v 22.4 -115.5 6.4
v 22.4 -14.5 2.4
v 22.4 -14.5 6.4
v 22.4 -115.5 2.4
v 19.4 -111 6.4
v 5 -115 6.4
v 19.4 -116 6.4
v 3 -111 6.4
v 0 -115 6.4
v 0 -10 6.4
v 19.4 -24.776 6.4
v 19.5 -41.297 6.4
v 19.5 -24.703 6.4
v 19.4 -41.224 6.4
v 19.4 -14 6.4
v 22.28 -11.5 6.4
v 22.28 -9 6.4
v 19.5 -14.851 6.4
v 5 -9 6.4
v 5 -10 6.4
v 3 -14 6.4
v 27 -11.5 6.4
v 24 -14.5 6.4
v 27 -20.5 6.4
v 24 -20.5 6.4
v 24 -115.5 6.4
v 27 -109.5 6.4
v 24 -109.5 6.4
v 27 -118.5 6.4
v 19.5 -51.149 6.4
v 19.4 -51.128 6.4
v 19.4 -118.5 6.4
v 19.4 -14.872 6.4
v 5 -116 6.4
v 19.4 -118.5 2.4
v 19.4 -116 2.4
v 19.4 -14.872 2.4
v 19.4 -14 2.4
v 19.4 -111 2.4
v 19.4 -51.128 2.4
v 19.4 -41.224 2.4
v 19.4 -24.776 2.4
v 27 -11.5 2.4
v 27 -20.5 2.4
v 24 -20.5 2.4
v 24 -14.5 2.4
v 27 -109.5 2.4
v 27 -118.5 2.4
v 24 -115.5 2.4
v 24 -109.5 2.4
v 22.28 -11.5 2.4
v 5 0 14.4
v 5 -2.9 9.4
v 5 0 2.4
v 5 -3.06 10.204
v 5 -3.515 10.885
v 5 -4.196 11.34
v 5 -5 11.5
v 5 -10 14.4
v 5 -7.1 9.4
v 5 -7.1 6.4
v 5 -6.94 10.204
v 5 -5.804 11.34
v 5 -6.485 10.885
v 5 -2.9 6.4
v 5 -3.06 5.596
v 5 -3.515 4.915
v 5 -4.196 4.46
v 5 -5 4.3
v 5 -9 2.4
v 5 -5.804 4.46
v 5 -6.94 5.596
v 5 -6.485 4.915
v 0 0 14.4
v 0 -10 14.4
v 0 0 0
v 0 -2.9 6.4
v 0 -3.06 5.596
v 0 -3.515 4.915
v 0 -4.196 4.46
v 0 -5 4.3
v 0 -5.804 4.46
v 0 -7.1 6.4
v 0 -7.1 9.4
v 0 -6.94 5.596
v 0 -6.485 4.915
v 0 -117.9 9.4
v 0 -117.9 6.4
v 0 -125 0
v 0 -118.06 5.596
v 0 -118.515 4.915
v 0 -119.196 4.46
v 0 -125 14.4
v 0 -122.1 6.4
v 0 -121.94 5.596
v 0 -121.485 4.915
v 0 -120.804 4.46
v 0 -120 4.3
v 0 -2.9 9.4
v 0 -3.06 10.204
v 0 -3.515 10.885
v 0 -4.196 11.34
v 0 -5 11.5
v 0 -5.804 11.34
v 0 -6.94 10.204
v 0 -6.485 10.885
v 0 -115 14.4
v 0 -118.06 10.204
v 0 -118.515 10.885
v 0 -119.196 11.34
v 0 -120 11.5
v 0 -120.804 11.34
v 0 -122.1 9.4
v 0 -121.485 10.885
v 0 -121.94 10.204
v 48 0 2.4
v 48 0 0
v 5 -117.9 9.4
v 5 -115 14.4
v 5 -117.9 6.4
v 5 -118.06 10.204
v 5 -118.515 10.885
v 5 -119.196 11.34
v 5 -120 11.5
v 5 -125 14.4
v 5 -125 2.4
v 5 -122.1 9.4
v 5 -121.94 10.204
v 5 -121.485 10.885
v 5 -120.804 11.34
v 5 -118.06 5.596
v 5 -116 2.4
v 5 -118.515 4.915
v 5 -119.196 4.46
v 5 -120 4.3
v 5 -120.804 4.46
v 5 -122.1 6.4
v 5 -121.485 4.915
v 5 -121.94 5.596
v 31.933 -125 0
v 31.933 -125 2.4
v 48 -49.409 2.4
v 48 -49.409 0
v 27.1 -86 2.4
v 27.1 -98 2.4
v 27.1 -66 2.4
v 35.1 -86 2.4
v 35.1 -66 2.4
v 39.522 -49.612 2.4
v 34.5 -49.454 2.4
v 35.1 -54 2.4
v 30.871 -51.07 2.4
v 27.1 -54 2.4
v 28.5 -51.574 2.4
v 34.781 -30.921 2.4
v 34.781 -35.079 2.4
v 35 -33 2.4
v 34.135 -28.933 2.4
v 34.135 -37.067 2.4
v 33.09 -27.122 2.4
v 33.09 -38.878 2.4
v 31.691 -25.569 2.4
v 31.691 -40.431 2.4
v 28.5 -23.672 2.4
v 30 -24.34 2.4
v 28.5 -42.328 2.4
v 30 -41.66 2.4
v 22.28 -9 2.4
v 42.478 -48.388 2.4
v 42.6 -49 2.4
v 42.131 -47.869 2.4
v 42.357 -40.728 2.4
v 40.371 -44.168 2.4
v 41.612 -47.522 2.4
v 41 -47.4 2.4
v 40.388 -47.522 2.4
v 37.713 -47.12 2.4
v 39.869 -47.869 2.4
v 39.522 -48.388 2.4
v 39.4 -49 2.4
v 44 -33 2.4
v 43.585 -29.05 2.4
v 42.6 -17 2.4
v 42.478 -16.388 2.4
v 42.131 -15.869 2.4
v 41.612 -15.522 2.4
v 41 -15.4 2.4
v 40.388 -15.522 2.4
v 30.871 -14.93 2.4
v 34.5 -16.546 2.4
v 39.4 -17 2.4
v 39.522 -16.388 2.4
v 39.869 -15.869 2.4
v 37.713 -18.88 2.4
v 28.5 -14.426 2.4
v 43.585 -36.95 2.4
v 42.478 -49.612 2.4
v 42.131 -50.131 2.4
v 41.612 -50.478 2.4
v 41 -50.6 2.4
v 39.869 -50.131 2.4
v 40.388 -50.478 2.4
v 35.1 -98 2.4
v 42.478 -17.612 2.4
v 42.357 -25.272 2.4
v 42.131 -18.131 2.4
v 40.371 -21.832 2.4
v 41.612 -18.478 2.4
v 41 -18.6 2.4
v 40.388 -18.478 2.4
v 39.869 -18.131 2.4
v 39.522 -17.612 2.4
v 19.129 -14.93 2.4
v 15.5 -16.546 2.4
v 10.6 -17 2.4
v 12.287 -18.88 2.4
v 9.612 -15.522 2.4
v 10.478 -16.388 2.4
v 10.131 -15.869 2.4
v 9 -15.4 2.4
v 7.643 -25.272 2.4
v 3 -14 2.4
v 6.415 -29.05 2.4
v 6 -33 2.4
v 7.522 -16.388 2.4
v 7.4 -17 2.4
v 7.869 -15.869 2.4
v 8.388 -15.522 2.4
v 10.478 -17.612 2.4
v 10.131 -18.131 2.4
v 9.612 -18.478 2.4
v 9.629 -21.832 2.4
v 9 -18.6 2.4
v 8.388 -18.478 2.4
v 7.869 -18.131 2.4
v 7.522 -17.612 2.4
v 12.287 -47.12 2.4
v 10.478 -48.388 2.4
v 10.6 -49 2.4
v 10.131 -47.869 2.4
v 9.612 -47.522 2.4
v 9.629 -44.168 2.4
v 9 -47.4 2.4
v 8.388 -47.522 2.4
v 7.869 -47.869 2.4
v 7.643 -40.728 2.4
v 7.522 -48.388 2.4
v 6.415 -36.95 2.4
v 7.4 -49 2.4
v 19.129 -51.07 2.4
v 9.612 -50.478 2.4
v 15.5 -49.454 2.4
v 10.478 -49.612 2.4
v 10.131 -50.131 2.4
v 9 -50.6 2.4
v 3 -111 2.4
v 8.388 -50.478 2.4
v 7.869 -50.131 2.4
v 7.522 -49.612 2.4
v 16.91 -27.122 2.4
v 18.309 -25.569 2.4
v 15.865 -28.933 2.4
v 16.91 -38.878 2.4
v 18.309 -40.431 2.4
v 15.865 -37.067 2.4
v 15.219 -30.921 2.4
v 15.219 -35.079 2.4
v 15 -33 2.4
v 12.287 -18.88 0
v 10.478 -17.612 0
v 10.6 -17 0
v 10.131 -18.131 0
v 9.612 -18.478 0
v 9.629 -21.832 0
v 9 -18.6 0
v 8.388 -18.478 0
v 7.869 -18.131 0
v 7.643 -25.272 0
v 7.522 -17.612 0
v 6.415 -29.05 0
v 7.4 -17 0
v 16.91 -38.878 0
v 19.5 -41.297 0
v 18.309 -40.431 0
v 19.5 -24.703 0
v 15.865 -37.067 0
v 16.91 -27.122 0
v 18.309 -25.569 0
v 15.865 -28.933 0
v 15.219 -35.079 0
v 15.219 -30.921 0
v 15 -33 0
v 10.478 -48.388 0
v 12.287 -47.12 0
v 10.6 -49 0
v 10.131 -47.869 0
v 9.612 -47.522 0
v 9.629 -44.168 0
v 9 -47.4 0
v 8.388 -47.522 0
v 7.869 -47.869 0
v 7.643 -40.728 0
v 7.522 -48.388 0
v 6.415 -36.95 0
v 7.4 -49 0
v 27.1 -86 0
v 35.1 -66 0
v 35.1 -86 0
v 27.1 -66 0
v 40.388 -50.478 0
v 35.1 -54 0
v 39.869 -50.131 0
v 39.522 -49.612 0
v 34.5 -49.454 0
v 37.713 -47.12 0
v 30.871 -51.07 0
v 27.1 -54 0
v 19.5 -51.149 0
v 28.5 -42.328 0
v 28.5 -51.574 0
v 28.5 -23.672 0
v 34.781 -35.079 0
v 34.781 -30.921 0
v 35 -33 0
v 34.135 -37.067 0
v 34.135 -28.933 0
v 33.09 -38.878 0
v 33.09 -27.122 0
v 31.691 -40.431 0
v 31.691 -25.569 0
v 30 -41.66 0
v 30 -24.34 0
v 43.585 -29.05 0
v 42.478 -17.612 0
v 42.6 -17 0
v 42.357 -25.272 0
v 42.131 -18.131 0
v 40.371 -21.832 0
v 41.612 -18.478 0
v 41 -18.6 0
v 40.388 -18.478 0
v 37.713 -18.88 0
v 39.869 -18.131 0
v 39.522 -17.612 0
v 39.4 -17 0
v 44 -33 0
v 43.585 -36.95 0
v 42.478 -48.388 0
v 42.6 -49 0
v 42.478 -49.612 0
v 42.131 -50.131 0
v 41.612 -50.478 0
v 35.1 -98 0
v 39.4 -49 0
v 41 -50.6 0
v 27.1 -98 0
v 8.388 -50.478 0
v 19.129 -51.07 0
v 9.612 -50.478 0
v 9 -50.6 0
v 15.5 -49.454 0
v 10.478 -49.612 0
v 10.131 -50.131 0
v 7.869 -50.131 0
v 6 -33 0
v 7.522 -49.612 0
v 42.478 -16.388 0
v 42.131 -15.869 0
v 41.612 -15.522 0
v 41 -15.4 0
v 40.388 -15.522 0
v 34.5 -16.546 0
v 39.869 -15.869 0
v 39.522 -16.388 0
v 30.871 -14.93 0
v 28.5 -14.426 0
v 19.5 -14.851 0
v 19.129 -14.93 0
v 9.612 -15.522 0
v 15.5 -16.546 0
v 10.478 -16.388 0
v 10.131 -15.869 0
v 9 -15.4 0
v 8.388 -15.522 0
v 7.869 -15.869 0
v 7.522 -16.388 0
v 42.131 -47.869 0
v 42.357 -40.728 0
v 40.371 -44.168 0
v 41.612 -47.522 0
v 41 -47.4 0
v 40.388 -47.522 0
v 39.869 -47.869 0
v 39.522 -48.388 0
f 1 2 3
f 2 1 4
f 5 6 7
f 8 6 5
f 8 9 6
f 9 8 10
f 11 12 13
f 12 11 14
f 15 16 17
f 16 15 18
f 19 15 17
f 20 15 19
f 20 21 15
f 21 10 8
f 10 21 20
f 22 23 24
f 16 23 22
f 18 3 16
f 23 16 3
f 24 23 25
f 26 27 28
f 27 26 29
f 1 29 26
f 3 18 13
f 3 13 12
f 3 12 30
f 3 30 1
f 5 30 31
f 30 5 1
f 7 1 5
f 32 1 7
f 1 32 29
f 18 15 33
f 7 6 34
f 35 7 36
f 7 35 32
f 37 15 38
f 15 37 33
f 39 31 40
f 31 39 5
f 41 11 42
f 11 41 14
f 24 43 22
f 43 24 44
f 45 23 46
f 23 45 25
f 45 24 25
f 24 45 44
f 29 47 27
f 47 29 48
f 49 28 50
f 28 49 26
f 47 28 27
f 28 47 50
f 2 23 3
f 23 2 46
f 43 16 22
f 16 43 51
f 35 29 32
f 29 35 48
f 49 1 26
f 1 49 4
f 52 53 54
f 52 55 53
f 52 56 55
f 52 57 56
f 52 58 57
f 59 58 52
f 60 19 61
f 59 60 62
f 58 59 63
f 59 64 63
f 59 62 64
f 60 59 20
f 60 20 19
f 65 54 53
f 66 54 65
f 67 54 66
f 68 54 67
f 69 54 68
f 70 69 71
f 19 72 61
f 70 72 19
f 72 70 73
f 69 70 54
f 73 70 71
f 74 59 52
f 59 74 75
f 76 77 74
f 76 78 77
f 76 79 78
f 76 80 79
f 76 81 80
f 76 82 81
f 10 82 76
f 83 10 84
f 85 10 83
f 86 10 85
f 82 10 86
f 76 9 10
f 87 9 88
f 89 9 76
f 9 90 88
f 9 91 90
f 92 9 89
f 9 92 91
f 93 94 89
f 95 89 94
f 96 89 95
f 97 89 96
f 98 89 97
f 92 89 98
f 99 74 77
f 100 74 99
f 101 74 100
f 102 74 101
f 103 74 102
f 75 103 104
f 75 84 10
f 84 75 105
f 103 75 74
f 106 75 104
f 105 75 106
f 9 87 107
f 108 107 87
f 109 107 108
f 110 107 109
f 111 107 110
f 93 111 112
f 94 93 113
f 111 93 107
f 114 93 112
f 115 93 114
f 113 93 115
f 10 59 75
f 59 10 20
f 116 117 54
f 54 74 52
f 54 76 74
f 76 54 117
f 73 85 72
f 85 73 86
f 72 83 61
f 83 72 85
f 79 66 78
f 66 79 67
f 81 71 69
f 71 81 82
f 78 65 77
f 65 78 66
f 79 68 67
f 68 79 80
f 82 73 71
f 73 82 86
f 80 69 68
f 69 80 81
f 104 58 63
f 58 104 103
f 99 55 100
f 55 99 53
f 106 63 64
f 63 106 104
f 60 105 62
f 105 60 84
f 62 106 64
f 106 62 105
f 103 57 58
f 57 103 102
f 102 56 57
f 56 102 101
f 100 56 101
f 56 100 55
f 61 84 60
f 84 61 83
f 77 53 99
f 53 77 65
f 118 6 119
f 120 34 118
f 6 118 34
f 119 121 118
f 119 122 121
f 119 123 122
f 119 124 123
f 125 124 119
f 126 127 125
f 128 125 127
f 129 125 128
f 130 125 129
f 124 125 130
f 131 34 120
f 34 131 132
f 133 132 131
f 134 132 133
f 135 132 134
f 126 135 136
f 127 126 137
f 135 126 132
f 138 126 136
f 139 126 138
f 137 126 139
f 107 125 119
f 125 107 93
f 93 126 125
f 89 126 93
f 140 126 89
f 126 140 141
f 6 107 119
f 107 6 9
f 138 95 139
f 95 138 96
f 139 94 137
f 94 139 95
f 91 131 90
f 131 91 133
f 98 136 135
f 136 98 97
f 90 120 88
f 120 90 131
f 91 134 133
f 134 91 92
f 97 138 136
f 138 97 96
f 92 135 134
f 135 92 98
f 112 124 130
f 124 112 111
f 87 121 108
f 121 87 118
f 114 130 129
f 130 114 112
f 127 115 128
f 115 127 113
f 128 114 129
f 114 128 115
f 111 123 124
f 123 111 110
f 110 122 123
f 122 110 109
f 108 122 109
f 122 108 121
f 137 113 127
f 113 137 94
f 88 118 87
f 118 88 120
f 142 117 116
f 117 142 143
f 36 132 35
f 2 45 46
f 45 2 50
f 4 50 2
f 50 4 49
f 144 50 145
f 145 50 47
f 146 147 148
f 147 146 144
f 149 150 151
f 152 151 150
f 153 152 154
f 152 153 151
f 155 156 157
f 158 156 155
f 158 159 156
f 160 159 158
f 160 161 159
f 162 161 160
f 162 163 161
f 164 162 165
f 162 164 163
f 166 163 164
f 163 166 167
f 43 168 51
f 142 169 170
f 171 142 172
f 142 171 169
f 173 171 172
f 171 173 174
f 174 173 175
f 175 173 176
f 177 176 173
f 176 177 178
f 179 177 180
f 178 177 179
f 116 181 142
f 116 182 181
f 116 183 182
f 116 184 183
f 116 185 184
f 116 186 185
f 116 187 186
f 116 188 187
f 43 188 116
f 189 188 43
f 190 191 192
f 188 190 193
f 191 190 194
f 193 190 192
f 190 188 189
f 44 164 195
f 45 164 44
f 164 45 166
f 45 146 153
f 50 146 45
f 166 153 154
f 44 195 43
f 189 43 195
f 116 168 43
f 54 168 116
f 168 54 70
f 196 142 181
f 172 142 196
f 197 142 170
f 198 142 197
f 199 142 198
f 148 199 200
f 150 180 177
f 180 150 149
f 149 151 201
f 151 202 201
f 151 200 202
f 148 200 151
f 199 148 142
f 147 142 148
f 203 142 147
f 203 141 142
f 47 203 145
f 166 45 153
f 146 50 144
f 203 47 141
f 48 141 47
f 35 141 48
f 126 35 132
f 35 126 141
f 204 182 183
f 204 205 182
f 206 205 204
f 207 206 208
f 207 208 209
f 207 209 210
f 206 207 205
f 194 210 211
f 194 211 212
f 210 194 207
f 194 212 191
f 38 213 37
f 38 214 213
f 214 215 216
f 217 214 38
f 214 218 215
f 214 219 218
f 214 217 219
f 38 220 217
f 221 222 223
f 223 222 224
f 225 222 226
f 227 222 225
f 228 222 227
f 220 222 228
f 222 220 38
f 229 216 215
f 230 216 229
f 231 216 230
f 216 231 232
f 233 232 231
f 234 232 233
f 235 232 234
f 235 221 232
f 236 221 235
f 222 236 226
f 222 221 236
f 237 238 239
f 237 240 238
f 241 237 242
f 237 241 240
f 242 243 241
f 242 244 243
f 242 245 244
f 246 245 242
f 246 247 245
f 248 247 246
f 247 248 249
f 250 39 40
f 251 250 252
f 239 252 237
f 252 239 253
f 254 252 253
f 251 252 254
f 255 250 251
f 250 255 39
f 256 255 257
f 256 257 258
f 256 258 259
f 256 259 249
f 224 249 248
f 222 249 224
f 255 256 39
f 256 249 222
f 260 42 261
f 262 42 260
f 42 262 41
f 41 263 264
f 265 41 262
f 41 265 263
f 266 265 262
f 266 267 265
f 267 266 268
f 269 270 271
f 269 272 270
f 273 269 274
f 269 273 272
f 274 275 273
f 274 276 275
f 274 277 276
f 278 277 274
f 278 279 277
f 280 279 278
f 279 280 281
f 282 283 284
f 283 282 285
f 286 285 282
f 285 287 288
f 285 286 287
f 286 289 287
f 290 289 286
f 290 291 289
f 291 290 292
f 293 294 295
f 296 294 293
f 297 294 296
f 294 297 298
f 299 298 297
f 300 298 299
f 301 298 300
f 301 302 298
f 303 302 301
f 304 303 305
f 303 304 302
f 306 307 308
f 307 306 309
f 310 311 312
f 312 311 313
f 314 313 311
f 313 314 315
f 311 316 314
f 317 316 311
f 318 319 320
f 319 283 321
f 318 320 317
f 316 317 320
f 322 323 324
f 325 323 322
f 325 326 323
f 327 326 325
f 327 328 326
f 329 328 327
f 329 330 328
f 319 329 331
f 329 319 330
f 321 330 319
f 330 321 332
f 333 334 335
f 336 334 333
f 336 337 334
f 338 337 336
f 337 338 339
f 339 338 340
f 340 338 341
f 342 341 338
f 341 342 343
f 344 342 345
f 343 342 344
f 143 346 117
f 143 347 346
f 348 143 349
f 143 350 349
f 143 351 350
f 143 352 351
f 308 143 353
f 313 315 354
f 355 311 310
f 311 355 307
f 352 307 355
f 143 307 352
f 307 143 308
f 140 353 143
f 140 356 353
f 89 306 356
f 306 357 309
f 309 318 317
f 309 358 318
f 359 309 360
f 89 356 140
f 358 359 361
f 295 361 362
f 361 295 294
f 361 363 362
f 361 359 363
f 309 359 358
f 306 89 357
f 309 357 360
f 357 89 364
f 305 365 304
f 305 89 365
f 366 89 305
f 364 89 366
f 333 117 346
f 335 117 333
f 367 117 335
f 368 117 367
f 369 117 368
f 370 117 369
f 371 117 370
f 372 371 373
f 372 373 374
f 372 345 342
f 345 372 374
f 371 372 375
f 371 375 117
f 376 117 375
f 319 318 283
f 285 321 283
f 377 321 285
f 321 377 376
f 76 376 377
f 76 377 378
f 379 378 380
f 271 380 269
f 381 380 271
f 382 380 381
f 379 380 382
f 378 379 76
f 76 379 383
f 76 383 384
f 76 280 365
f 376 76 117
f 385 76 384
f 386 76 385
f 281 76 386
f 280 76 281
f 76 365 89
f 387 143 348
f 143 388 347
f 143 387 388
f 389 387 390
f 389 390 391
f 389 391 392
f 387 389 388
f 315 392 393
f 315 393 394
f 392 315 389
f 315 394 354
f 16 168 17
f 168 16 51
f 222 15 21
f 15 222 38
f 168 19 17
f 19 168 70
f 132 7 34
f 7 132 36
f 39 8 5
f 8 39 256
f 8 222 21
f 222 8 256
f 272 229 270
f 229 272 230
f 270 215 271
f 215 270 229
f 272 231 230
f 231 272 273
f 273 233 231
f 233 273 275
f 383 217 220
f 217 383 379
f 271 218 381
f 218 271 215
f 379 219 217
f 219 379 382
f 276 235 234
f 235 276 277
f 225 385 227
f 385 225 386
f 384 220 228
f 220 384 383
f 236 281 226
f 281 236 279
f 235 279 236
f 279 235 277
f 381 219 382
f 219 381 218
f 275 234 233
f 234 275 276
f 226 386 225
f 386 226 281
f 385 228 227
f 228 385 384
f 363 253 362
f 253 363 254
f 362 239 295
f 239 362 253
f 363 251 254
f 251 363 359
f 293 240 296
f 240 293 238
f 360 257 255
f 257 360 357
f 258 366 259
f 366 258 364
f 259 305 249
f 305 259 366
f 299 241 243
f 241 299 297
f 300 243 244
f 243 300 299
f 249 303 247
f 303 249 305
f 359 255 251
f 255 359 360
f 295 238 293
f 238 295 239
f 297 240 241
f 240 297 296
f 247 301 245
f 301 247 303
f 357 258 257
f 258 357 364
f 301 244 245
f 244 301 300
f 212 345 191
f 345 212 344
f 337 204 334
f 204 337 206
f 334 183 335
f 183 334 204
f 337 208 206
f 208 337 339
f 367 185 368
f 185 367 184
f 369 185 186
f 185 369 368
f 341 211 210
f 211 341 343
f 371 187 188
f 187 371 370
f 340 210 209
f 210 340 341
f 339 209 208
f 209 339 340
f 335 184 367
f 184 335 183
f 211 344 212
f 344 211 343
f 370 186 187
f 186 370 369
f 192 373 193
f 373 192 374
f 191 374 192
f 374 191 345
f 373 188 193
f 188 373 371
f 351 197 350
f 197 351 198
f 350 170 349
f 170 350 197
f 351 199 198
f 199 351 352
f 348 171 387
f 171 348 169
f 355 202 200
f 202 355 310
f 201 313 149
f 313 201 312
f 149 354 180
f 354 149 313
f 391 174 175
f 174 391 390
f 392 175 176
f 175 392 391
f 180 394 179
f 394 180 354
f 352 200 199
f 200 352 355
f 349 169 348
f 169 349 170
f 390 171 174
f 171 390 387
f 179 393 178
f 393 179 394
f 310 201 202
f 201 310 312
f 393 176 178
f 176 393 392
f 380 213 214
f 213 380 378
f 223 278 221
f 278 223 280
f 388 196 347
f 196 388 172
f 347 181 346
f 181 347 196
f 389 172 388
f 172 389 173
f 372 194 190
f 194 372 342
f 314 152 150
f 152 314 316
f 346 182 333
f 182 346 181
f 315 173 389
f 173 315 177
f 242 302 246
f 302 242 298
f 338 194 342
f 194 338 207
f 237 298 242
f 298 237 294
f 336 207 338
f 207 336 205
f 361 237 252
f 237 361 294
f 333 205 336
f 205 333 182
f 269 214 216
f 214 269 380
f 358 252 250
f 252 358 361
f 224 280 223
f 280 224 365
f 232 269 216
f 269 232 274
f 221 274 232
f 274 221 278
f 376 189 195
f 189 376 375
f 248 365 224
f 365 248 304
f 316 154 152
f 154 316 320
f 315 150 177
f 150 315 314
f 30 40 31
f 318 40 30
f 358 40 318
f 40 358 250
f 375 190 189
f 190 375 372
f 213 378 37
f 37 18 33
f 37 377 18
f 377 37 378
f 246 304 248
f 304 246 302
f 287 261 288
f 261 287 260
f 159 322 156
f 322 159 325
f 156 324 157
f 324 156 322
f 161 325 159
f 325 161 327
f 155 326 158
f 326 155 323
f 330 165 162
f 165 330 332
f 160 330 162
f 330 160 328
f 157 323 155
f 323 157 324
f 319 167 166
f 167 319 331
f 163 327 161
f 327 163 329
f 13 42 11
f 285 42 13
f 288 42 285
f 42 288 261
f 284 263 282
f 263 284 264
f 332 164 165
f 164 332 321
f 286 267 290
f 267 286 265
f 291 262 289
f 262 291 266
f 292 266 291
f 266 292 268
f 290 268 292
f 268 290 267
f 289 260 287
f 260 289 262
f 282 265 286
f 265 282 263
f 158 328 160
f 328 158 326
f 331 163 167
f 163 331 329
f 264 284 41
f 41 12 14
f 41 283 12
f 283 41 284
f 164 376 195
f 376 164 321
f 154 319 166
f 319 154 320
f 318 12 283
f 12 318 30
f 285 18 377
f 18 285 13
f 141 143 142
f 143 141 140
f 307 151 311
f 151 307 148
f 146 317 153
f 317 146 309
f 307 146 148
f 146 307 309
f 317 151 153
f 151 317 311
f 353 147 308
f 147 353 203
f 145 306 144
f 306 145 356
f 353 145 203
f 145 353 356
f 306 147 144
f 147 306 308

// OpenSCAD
// Fan and Duet read board holder for 2020 Kossel

thickness=2.4;
leftMargin=10;
rightMargin=15;
ribThickness=3;
ribHeight=4;
pcbThick=1.6;
pcbClear=0.1;
pcbWidth=100;
pcbWclear=0.5;
pcbOffset=24;
m3ClearRad=1.6;
m4ClearRad=2.1;
overlap=0.02;

module duetRibs() {
	translate([-pcbThick-ribThickness,-overlap-pcbWclear,thickness-overlap])
		cube([ribThickness,pcbWidth+2*pcbWclear+2*overlap,ribHeight+overlap]);

	translate([0,-overlap-pcbWclear,thickness-overlap])
		cube([ribThickness,6+overlap,ribHeight+overlap]);
	translate([0,pcbWidth+pcbWclear-6,thickness-overlap])
		cube([ribThickness,6+overlap,ribHeight+overlap]);

	translate([-ribThickness-pcbThick,-ribThickness-pcbWclear,thickness-overlap])
		cube([pcbThick+2*ribThickness,ribThickness,ribHeight+overlap]);
	translate([-ribThickness-pcbThick,pcbWidth+pcbWclear,thickness-overlap])
		cube([pcbThick+2*ribThickness,ribThickness,ribHeight+overlap]);
}

module foot() {
	difference() {
		translate([0,0,thickness-overlap]) cube([5,10,12+overlap]);
		translate([-overlap,5,thickness+4])
			rotate([0,90,0])
				cylinder(r=m4ClearRad,h=10,$fn=16);
		translate([-overlap,5,thickness+7])
			rotate([0,90,0])
				cylinder(r=m4ClearRad,h=10,$fn=16);
		translate([-overlap,5,thickness+5.5])
			cube([20,2*m4ClearRad,3],center=true);
	}
}

module supportRib() {
	cube([pcbOffset-pcbThick-pcbClear-overlap,5,ribHeight+overlap]);
}

module fanCutouts() {
	translate([0,0,-overlap])
		difference() {
			union() {
				cylinder(r=19,h=10);
				for(x=[-16,16])
					for(y=[-16,16])
						translate([x,y,-overlap]) cylinder(r=m3ClearRad,h=20,$fn=16);
			}
			translate([0,0,-overlap]) cylinder(r=10,h=10);
			translate([-1,0,-overlap]) cube([9,100,20], center=true);
		}
}

module terminalCutout() {
	cube([8,12,20],center=true);
}

mirror([0,1,0])
difference() {
	union() {
		cube([48,pcbWidth+leftMargin+rightMargin,thickness]);
		translate([pcbOffset,rightMargin,0]) duetRibs();
		foot();
		translate([0,pcbWidth+leftMargin+rightMargin-10,0]) foot();
		translate([0,10-1,thickness-overlap]) supportRib();
		translate([0,pcbWidth+leftMargin+rightMargin-10-5+1,thickness-overlap])
			supportRib();	
		translate([0,10-overlap,thickness-overlap])
			cube([ribThickness,pcbWidth+leftMargin+rightMargin-20+2*overlap,ribHeight+overlap]);
	}
	translate([25,rightMargin+18,0]) fanCutouts();
	translate([50,40,-overlap]) rotate([0,0,12]) cube([200,200,10]);
	translate([pcbOffset+pcbClear+7,rightMargin+45,0]) terminalCutout();
	translate([pcbOffset+pcbClear+7,rightMargin+77,0]) terminalCutout();
}
